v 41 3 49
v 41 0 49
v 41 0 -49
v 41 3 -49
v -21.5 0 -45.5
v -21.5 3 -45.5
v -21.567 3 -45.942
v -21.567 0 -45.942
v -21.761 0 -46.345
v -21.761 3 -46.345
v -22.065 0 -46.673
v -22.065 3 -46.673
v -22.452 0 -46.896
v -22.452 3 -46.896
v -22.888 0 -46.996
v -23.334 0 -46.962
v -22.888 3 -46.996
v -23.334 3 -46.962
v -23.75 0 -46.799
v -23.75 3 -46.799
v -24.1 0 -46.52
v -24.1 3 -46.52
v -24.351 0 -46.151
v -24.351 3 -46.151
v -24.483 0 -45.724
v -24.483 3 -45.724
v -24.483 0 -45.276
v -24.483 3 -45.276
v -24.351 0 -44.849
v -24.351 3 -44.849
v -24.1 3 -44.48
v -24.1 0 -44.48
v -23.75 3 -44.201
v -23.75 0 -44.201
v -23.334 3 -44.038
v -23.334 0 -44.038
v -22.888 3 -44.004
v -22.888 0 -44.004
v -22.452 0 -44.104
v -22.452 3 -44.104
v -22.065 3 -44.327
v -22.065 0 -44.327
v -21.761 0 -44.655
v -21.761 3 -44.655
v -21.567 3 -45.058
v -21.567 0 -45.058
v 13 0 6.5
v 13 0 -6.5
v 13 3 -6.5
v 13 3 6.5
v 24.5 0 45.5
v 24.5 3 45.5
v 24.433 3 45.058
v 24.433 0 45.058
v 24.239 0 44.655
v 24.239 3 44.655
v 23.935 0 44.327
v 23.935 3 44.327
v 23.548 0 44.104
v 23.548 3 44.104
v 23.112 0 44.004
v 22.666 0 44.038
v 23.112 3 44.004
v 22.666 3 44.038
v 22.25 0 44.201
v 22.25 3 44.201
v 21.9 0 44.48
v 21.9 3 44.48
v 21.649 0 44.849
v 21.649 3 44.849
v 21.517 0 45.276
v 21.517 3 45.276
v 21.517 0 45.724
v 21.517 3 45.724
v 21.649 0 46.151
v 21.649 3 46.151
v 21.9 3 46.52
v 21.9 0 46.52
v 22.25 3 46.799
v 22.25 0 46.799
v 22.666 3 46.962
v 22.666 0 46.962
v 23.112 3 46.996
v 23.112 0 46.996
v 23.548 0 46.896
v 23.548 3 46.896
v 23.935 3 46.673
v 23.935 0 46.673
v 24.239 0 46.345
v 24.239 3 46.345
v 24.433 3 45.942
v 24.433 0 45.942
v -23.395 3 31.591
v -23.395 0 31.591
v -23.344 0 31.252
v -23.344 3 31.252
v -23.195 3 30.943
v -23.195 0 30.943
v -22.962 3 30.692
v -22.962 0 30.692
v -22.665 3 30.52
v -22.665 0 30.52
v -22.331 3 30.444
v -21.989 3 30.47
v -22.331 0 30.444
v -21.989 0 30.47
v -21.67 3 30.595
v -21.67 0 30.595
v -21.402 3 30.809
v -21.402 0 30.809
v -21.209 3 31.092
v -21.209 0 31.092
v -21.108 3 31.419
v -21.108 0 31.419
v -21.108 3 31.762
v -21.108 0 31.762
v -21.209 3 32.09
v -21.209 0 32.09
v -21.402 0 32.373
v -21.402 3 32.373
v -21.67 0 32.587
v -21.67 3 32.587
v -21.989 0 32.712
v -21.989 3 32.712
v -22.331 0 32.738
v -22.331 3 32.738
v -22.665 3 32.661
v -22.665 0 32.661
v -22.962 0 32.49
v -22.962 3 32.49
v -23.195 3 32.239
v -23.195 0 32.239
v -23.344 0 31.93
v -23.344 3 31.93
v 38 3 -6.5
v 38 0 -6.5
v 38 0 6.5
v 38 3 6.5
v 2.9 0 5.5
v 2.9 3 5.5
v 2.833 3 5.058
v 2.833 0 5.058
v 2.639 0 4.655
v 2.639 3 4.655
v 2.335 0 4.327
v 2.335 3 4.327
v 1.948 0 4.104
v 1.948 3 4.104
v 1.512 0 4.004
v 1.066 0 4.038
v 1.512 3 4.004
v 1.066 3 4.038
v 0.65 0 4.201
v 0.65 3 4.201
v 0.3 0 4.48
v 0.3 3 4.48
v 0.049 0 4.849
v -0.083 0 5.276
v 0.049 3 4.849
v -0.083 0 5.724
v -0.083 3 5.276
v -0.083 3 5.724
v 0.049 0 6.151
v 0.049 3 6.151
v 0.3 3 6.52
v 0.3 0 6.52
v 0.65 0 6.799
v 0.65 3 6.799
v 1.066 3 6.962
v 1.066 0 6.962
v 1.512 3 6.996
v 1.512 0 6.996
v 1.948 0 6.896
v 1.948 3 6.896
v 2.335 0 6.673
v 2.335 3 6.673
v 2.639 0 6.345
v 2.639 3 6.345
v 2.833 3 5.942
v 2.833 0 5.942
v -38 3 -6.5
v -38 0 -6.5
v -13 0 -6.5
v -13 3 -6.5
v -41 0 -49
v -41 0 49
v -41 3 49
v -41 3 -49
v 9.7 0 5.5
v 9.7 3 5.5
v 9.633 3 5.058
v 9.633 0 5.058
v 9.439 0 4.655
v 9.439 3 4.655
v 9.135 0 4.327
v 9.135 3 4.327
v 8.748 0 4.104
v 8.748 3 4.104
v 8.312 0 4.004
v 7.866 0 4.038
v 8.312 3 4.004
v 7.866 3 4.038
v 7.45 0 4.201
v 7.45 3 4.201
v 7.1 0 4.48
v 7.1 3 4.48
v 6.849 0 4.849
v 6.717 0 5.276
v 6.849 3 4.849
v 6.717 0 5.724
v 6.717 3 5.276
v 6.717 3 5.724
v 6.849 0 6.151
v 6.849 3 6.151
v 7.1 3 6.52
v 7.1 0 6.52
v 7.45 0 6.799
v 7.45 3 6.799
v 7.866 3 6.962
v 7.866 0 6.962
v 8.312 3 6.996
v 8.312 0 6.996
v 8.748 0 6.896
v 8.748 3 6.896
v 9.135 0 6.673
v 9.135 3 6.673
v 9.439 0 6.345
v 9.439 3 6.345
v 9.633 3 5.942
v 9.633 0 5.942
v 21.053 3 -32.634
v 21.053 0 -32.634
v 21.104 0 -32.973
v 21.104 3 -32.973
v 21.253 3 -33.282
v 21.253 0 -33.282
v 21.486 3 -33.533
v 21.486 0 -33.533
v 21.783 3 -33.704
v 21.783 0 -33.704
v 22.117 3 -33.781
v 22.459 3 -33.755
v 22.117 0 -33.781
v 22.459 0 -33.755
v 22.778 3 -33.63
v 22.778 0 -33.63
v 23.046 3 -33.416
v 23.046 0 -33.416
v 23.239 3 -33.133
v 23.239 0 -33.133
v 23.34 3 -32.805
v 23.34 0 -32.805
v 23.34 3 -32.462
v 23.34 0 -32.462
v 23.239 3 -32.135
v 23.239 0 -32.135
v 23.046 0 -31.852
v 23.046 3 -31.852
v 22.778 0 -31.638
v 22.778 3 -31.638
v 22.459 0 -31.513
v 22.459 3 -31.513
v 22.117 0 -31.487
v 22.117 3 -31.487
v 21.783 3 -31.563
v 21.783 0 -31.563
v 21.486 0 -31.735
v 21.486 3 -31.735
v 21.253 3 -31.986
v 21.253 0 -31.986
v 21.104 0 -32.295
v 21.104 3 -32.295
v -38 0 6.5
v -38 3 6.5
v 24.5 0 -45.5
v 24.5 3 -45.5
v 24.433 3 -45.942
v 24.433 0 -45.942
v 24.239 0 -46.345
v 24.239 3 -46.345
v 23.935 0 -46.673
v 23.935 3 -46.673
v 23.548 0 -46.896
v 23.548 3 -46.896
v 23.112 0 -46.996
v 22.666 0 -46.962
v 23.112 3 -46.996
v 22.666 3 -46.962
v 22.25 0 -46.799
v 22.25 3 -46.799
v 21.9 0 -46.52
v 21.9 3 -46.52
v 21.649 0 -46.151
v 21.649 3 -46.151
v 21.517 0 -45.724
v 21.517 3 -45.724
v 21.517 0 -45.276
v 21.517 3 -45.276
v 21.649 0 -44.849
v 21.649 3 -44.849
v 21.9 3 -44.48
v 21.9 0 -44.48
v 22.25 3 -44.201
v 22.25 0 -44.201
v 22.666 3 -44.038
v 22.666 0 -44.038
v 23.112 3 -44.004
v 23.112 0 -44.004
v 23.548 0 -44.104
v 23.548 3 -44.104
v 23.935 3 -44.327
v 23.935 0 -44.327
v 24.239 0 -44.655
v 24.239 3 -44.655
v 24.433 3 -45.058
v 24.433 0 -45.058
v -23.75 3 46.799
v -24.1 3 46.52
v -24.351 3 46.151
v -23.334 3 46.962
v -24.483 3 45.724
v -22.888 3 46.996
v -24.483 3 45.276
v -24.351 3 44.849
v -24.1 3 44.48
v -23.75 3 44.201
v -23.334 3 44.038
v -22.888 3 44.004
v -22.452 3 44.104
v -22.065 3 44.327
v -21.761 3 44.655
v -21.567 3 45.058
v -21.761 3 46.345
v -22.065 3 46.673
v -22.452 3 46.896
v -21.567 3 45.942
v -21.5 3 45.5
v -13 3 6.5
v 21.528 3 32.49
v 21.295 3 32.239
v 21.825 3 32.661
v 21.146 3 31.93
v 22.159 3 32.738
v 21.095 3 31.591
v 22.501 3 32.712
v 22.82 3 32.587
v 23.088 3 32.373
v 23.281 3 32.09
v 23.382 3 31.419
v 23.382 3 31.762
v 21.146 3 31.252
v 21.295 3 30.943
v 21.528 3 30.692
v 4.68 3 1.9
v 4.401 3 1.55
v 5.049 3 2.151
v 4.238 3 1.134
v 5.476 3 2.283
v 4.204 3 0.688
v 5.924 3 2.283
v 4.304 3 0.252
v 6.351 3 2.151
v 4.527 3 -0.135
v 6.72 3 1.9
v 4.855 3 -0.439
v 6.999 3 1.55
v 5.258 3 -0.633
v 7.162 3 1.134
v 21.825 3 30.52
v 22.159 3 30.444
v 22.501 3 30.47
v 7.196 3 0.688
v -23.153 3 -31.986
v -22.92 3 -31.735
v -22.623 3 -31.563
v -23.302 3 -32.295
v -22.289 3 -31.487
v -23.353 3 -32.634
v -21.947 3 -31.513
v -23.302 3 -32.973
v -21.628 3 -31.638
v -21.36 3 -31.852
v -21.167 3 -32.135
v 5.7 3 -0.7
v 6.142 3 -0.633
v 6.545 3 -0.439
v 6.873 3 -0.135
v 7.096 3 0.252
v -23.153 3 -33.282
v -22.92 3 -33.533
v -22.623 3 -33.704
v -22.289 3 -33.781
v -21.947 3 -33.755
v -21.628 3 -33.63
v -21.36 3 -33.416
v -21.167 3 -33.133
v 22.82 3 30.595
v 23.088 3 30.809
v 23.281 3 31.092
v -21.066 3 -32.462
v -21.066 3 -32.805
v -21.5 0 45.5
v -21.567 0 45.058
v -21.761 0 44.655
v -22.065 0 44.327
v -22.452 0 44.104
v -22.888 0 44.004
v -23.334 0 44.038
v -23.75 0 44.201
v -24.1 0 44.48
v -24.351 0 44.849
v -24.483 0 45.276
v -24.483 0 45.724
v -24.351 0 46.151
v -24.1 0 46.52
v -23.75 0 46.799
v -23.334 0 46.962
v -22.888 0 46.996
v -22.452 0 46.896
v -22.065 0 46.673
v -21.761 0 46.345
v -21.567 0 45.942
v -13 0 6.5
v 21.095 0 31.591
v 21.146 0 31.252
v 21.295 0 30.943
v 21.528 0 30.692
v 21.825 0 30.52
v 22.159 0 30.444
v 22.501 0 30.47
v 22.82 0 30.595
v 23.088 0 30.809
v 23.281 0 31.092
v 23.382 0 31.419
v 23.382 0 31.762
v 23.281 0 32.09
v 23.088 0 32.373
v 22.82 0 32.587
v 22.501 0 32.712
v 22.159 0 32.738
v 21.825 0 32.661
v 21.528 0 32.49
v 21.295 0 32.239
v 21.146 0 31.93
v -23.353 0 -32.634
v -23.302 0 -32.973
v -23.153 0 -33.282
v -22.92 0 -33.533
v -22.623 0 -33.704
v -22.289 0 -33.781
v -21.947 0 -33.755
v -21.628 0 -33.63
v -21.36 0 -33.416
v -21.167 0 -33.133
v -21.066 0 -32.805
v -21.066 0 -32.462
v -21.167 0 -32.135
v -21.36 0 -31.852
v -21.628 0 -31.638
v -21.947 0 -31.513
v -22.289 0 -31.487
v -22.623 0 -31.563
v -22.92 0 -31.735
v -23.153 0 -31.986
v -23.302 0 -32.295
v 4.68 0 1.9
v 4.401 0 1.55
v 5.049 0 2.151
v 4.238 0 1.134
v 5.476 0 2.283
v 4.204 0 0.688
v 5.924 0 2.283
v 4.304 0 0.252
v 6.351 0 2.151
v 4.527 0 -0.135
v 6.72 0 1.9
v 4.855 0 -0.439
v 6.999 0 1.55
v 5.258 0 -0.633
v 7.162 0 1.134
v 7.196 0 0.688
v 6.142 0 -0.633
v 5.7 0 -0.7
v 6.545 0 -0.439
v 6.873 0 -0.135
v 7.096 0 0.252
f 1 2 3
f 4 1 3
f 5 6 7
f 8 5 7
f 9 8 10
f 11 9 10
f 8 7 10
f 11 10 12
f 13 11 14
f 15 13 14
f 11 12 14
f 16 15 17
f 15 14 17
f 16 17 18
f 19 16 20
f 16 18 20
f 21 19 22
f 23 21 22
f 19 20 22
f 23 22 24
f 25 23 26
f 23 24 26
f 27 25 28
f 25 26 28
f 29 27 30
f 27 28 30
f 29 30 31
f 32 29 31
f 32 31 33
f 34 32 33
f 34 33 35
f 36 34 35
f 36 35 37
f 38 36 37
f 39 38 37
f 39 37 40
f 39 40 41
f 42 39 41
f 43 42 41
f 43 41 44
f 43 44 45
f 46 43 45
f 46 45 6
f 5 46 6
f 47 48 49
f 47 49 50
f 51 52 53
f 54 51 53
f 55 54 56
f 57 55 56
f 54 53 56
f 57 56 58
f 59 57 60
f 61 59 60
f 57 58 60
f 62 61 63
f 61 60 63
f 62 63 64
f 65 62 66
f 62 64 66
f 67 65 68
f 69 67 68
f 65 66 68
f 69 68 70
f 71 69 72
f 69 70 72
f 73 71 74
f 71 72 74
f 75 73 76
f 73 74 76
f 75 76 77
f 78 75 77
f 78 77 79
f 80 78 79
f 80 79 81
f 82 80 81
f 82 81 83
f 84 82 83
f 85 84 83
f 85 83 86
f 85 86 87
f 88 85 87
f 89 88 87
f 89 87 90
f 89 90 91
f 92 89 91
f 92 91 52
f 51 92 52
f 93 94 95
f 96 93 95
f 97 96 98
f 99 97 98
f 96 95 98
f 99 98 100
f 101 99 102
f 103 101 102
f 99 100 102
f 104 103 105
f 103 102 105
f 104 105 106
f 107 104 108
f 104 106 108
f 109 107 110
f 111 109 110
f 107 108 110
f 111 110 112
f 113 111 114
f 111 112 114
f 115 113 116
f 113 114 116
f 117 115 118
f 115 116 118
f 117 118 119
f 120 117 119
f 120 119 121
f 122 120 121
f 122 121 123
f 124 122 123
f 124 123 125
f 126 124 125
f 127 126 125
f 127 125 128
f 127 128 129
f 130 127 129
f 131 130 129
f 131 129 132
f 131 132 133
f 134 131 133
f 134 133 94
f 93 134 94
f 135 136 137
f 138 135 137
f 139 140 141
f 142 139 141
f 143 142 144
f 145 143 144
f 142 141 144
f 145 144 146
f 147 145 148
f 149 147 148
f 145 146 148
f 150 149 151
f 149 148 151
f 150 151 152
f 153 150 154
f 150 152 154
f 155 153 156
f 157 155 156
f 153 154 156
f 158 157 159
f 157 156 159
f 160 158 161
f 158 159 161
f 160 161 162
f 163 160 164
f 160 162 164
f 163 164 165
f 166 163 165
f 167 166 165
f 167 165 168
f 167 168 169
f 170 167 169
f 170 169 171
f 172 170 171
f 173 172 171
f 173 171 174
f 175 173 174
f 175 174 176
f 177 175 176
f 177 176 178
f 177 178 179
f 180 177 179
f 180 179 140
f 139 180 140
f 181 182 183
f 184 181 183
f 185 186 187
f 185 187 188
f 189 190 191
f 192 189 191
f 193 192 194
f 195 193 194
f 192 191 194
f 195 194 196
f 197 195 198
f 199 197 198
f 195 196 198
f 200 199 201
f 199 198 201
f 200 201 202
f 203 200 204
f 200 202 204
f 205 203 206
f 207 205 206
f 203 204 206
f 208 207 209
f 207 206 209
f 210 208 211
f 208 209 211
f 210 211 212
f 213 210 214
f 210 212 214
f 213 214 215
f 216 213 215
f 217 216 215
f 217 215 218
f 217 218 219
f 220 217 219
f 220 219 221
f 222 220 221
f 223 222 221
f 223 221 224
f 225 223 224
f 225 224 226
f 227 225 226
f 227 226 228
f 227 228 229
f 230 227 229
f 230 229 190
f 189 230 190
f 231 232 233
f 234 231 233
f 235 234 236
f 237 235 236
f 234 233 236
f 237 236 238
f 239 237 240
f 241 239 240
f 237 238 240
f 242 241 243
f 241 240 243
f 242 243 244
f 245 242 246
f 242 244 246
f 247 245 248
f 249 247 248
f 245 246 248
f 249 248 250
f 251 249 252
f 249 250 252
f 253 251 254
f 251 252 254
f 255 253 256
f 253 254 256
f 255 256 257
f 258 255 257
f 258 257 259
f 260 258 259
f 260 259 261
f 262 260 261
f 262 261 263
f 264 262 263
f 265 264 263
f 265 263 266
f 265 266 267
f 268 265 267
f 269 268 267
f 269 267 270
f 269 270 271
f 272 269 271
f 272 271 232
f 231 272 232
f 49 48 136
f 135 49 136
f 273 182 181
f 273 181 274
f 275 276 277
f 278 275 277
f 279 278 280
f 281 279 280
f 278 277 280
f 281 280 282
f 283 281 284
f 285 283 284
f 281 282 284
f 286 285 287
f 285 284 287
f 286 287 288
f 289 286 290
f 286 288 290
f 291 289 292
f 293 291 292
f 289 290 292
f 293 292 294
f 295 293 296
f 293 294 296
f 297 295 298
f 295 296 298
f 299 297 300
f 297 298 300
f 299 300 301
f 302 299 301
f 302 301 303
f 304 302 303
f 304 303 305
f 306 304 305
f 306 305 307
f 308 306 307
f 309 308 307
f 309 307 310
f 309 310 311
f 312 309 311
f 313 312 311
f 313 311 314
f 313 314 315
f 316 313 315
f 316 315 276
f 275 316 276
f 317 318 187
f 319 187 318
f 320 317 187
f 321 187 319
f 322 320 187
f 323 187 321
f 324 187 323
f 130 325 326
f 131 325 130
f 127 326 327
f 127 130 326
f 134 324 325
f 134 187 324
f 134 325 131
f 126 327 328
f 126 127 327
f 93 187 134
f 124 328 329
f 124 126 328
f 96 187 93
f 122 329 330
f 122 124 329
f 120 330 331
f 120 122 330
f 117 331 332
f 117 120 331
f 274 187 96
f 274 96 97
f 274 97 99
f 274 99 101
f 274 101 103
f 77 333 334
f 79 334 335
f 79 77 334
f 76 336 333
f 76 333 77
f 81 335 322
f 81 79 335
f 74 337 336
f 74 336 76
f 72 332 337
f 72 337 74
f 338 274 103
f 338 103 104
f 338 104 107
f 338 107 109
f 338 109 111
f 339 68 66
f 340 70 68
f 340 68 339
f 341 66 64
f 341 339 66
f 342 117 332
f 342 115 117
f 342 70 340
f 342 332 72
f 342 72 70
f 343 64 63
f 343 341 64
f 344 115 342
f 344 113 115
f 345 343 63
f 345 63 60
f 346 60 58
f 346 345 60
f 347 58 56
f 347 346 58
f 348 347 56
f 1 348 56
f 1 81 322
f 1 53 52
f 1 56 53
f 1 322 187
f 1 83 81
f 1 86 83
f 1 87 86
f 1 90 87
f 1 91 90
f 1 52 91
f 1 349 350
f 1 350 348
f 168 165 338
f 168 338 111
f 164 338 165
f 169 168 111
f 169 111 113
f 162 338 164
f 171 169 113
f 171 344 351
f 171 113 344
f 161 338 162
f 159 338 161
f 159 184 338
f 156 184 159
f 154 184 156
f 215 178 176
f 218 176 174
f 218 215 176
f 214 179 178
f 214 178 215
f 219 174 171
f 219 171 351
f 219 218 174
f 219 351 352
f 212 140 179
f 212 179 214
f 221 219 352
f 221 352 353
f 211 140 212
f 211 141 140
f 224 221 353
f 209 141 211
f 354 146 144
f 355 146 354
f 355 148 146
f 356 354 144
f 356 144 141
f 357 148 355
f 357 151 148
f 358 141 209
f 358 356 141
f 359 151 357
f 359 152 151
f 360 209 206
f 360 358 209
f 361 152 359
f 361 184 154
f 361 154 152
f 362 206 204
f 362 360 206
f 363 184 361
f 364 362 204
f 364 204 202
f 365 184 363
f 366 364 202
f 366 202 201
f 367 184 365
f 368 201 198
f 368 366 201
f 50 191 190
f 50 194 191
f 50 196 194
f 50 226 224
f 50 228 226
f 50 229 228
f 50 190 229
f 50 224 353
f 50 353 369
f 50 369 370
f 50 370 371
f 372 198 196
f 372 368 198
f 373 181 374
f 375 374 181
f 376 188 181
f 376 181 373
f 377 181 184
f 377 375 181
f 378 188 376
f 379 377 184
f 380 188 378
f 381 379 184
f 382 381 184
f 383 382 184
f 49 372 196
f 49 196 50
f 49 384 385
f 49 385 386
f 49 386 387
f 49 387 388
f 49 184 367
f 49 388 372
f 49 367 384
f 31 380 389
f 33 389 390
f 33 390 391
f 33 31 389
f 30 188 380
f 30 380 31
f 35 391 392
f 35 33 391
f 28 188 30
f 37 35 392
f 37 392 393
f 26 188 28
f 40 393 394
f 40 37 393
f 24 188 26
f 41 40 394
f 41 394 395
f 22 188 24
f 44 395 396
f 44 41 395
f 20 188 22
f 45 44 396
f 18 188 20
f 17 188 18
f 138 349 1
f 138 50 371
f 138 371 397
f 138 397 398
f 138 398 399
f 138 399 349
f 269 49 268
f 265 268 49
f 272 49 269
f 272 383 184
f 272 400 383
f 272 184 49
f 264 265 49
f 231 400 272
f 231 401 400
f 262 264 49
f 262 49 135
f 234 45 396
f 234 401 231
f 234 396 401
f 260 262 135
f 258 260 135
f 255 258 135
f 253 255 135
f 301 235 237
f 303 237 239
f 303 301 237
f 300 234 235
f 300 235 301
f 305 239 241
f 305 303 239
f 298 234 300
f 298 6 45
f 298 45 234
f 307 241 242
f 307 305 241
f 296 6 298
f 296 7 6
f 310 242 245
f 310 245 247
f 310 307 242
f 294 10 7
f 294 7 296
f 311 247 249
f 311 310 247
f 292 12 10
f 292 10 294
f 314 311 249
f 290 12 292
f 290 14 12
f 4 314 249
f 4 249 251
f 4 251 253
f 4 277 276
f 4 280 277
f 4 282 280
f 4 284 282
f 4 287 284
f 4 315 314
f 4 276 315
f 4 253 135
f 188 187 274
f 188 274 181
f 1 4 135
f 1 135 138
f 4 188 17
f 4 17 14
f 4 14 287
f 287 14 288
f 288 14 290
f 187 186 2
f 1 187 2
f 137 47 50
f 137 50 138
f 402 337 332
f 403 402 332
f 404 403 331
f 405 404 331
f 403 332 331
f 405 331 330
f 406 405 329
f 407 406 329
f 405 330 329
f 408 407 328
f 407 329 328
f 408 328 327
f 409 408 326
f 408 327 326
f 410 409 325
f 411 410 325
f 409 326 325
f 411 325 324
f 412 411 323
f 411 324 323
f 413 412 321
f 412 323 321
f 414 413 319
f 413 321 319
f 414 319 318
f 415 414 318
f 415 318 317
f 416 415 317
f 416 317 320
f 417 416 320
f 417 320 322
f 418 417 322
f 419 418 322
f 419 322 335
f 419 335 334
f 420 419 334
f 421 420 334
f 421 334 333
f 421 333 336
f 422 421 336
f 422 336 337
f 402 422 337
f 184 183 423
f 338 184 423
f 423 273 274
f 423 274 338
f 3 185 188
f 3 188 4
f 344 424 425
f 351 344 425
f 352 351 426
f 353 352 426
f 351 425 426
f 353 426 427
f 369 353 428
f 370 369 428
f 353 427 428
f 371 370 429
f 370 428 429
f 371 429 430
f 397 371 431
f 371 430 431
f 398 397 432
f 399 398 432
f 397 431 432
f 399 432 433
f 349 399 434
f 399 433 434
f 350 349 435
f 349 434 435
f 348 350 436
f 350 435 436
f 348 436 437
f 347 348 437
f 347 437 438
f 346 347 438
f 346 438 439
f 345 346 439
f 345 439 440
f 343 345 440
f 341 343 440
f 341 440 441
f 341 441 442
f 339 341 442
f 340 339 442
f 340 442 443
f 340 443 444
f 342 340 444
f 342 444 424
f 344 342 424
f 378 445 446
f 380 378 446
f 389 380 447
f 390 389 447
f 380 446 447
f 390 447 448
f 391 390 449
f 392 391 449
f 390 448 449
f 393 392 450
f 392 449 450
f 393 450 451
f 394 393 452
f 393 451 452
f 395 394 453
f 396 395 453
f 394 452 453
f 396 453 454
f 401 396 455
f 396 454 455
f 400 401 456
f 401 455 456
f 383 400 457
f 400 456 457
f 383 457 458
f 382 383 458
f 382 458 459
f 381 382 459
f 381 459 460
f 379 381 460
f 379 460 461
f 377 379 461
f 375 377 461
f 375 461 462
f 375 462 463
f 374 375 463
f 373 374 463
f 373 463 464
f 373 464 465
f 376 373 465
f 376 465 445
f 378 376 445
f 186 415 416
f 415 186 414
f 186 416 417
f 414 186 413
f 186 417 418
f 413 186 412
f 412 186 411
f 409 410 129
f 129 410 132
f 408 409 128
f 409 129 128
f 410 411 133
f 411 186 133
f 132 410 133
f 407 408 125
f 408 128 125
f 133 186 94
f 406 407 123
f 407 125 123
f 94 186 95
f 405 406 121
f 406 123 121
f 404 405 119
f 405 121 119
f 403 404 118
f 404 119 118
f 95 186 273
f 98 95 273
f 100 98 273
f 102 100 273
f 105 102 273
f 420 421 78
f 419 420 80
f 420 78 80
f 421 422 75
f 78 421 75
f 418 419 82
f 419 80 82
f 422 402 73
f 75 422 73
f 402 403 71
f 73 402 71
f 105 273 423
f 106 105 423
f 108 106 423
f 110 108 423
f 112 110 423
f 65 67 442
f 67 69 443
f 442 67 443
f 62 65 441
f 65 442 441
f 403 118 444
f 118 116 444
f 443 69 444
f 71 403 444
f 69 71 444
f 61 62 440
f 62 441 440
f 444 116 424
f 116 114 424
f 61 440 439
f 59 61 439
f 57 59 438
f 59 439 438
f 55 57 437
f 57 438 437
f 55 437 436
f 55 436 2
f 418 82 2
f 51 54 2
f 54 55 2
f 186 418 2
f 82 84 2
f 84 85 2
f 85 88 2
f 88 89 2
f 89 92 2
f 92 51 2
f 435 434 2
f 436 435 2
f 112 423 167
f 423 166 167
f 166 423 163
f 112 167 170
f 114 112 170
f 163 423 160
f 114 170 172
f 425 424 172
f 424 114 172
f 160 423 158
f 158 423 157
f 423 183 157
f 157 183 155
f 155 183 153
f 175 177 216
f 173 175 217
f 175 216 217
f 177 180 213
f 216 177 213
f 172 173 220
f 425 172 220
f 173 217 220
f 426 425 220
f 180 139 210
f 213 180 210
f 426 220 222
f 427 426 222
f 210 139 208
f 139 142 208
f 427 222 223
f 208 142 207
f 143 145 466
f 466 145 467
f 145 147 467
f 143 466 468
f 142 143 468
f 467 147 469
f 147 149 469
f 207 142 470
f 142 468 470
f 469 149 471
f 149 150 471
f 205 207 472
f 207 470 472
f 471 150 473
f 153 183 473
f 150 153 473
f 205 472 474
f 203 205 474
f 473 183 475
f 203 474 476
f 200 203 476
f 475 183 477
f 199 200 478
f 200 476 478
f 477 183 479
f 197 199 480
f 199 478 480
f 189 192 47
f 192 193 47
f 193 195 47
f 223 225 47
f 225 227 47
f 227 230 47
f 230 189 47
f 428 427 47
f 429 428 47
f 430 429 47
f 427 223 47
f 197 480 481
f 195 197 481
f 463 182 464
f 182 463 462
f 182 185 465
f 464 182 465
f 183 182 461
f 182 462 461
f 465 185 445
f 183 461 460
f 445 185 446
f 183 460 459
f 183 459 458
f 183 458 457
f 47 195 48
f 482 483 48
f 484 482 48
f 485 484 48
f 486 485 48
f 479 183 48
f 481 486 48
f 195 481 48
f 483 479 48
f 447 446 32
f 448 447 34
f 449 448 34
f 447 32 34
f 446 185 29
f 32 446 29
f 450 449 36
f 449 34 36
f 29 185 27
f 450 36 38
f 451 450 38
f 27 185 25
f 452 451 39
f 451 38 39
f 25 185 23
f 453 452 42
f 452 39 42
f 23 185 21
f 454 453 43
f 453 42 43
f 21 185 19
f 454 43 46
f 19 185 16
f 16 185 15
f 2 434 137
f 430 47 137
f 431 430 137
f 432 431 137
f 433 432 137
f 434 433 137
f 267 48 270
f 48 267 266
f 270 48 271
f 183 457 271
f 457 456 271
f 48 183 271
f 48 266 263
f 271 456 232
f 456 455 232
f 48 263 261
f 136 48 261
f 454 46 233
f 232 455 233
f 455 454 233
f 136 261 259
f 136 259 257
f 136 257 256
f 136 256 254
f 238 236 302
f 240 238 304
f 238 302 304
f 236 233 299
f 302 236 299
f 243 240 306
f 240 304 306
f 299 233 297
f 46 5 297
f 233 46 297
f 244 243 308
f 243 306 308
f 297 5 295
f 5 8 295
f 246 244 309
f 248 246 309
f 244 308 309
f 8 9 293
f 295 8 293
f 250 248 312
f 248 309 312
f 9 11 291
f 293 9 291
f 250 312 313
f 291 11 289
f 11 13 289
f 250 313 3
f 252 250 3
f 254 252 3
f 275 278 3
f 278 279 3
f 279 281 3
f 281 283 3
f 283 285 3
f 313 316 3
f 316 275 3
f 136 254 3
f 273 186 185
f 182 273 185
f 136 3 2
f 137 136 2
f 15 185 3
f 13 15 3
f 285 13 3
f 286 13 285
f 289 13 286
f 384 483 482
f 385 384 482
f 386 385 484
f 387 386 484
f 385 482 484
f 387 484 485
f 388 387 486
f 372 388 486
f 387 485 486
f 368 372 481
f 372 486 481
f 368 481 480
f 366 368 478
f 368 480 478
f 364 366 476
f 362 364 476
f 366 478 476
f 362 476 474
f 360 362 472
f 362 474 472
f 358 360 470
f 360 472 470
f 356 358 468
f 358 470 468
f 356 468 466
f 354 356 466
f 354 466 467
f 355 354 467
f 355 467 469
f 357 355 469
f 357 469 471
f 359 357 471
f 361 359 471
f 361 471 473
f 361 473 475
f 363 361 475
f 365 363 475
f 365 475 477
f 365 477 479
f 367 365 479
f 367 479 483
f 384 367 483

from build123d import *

# Parameters (mm, degrees)
SKETCH1_W                      = 82
SKETCH1_H                      = 98
BOSS_EXTRUDE1_DEPTH            = 3
F_3_0_3_DIAMETER_HOLE1_D       = 3
F_3_0_3_DIAMETER_HOLE1_DEPTH   = 30
SKETCH5_W                      = 25
SKETCH5_H                      = 13
CUT_EXTRUDE1_DEPTH             = 10
F_2_3_2_3_DIAMETER_HOLE1_D     = 2.3
F_2_3_2_3_DIAMETER_HOLE1_DEPTH = 30
SKETCH8_R                      = 1.5
CUT_EXTRUDE2_DEPTH             = 10
F_3_0_3_DIAMETER_HOLE2_D       = 3
F_3_0_3_DIAMETER_HOLE2_DEPTH   = 6.5


with BuildPart() as part:
    # Sketch1 → Boss-Extrude1 (new body)
    with BuildSketch(Plane(origin=(0, 0, 0), x_dir=(1, 0, 0), z_dir=(0, 1, 0))):
        Rectangle(SKETCH1_W, SKETCH1_H)
    extrude(amount=BOSS_EXTRUDE1_DEPTH)

    # Ø3.0 (3) Diameter Hole1
    with Locations(Plane(origin=(0, 0, 0), x_dir=(-1, 0, 0), z_dir=(0, -1, 0))):
        with Locations((23, -45.5), (-23, -45.5), (-23, 45.5), (23, 45.5)):
            Hole(F_3_0_3_DIAMETER_HOLE1_D / 2, depth=F_3_0_3_DIAMETER_HOLE1_DEPTH)

    # Sketch5 → Cut-Extrude1 (cut)
    with BuildSketch(Plane.XZ):
        with Locations((-25.5, 0)):
            Rectangle(SKETCH5_W, SKETCH5_H)
        with Locations((25.5, 0)):
            Rectangle(SKETCH5_W, SKETCH5_H)
    extrude(amount=-CUT_EXTRUDE1_DEPTH, mode=Mode.SUBTRACT)

    # Ø2.3 (2.3) Diameter Hole1
    with Locations(Plane(origin=(0, 3, 0), x_dir=(1, 0, 0), z_dir=(0, 1, 0))):
        with Locations((-22.24500144, -31.590736692), (22.24500144, -31.590736692), (22.203117232, 32.633806534), (-22.203117232, 32.633806534)):
            Hole(F_2_3_2_3_DIAMETER_HOLE1_D / 2, depth=F_2_3_2_3_DIAMETER_HOLE1_DEPTH)

    # Sketch8 → Cut-Extrude2 (cut)
    with BuildSketch(Plane.XZ):
        with Locations(Location((5.7, 0.8, 0), (0, 0, 270))):
            Circle(SKETCH8_R)
    extrude(amount=-CUT_EXTRUDE2_DEPTH, mode=Mode.SUBTRACT)

    # Ø3.0 (3) Diameter Hole2
    with Locations(Plane(origin=(0, 0, 0), x_dir=(-1, 0, 0), z_dir=(0, -1, 0))):
        with Locations((-1.4, -5.5), (-8.2, -5.5)):
            Hole(F_3_0_3_DIAMETER_HOLE2_D / 2, depth=F_3_0_3_DIAMETER_HOLE2_DEPTH)


solid = part.part
